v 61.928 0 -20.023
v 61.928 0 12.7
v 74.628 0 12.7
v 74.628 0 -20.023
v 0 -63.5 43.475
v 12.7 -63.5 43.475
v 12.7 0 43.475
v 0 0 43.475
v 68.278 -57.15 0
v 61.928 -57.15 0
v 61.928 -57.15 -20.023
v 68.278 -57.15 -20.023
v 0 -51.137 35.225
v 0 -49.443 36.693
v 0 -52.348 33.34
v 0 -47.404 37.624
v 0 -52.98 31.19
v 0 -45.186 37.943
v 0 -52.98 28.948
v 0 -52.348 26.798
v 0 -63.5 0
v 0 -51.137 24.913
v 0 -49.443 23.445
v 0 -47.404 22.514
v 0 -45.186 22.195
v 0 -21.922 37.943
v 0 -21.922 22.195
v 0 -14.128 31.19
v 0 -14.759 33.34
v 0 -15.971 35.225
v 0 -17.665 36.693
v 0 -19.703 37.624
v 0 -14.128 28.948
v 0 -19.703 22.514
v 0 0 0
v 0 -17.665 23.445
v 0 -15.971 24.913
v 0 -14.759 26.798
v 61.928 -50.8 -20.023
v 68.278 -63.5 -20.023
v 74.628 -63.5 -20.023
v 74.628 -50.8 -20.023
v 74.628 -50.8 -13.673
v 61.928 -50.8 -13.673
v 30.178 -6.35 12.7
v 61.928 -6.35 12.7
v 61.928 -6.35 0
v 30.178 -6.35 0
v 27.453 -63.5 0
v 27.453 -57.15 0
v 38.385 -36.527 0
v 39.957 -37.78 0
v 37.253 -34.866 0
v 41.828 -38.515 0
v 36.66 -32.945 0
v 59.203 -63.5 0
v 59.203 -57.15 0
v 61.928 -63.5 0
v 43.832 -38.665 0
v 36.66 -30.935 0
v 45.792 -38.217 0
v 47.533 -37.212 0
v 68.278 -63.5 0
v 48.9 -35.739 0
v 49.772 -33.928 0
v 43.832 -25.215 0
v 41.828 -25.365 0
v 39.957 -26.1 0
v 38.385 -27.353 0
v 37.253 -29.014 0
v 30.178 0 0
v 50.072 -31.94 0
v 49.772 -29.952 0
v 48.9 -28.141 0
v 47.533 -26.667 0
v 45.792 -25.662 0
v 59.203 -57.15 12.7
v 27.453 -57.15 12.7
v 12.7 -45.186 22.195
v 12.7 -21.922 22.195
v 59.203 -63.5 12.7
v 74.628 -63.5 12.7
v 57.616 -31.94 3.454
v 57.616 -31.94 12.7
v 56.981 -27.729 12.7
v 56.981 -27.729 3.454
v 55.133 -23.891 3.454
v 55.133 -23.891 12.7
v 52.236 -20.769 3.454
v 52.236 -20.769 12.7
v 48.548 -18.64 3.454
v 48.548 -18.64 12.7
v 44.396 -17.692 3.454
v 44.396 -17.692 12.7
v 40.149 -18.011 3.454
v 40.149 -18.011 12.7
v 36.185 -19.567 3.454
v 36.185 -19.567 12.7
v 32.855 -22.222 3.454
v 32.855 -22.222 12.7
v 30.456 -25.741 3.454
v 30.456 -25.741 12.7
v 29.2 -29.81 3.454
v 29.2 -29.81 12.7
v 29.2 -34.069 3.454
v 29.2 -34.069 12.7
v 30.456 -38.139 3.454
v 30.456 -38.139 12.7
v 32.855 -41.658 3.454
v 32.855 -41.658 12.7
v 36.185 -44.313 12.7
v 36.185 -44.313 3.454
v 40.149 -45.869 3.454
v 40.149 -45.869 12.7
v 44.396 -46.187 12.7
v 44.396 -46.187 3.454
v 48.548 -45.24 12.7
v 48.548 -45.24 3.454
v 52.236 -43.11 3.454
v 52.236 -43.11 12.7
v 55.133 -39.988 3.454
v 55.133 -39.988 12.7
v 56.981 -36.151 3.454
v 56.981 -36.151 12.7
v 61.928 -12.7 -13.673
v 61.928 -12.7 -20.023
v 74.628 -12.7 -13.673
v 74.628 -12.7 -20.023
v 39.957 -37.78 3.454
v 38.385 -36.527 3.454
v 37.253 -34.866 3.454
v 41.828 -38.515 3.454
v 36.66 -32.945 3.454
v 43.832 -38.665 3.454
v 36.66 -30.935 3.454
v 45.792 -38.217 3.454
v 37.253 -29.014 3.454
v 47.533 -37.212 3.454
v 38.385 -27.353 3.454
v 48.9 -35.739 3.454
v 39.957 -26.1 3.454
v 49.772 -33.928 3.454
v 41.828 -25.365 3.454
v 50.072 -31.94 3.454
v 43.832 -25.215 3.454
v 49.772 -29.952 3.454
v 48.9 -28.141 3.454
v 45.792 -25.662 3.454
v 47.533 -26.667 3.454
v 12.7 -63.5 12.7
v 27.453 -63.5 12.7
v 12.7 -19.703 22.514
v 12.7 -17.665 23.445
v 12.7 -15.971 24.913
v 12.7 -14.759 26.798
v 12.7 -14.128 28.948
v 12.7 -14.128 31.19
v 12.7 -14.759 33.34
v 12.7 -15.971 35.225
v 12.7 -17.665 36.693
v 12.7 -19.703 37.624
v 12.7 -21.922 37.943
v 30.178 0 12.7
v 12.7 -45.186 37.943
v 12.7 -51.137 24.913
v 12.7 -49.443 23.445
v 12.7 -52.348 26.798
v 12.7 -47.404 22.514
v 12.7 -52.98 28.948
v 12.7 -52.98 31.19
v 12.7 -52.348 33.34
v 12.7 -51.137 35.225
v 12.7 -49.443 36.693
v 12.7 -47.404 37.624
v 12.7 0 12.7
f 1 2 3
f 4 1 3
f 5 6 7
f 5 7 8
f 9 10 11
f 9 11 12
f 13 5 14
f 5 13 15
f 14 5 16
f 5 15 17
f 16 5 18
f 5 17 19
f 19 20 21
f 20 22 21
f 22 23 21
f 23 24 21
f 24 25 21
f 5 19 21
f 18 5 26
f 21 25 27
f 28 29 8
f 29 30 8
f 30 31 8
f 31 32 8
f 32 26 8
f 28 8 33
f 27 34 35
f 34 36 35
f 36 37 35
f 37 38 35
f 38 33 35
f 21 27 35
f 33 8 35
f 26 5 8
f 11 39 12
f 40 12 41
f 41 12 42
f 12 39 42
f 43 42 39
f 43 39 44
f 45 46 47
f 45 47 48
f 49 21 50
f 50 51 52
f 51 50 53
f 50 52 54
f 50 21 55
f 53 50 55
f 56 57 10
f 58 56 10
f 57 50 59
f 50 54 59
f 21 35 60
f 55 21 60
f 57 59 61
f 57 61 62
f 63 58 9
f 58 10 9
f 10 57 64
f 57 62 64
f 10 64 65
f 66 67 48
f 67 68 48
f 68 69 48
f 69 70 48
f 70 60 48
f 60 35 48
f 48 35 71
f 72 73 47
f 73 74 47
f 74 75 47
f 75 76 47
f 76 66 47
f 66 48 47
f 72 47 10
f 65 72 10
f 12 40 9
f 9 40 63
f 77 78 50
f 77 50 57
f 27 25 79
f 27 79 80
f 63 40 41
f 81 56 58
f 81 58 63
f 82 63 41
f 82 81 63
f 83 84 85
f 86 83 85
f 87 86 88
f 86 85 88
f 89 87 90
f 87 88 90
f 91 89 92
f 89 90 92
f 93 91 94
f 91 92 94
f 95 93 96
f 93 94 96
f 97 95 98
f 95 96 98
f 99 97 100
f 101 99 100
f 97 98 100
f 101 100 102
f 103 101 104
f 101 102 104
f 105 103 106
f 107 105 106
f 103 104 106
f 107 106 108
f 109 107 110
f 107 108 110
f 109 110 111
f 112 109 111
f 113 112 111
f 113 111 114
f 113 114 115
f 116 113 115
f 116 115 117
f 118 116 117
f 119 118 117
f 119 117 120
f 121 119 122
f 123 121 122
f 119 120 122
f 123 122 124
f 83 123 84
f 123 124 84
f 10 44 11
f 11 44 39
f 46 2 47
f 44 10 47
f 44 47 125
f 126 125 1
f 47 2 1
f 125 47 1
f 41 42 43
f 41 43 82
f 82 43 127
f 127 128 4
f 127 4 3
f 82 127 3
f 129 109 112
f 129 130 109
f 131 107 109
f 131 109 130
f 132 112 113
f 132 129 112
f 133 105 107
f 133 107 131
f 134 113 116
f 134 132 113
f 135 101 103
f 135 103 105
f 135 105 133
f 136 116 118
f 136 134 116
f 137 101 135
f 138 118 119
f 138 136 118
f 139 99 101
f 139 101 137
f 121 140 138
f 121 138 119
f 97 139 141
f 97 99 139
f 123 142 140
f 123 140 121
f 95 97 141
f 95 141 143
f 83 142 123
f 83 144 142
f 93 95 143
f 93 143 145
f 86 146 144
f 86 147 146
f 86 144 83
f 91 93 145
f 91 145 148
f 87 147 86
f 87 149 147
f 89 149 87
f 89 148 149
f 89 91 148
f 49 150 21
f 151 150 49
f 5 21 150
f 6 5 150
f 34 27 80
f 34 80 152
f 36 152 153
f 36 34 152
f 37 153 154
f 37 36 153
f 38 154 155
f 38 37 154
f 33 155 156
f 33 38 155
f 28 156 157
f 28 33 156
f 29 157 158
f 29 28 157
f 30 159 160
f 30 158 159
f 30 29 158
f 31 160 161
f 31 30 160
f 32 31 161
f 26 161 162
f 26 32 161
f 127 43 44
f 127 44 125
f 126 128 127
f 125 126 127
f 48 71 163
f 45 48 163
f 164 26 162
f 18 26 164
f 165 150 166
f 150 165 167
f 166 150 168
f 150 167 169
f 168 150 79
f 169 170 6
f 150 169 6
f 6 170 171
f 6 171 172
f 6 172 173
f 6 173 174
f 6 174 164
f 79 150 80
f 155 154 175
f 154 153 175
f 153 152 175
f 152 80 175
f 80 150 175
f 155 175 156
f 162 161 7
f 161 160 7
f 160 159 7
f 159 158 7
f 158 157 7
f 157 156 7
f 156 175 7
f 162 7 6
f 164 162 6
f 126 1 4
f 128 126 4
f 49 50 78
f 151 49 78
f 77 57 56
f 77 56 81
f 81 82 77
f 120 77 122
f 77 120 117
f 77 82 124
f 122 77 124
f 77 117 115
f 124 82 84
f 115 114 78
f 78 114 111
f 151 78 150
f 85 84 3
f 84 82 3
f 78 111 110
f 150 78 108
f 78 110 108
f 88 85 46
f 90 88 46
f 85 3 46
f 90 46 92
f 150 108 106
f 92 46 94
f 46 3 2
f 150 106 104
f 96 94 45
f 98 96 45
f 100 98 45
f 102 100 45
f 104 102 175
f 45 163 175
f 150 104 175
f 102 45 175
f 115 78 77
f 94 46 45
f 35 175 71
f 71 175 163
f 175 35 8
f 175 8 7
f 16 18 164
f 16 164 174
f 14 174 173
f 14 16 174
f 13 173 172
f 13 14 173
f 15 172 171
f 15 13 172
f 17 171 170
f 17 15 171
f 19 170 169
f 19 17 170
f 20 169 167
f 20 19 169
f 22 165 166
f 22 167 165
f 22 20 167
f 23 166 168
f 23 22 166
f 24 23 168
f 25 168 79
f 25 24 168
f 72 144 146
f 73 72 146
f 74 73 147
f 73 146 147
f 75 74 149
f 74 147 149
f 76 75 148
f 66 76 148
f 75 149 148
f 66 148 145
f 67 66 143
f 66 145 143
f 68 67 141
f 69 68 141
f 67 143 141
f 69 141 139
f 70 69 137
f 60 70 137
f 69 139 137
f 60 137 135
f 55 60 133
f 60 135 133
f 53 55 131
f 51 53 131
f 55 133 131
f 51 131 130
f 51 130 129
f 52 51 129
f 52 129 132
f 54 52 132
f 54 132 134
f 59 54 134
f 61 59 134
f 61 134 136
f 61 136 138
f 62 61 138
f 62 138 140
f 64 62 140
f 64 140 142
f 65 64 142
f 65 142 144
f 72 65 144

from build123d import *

# Parameters (mm, degrees)
F1_DEPTH  = 63.5
F2_W      = 31.75
F2_H      = 12.7
F2_W_2    = 6.35
F2_H_2    = 20.0227687303
F3_DEPTH  = 6.35
F4_W      = 38.1
F4_H      = 6.35
F5_DEPTH  = 74.629437754
F7_DEPTH  = 74.629437754
F8_R      = 14.2875
F8_R_2    = 6.7437
F9_DEPTH  = 9.2456
F10_R     = 6.7437
F11_DEPTH = 23.4781687303
F12_W     = 31.75
F12_H     = 12.7
F13_DEPTH = 6.35


with BuildPart() as f1:
    # F0 (on Front) → F1 (new body)
    with BuildSketch(Plane.XZ):
        Polygon((0, 43.474850689), (0, 0), (61.928437754, 0), (61.928437754, -20.0227687303), (74.628437754, -20.0227687303), (74.628437754, 12.7), (61.928437754, 12.7), (30.178437754, 12.7), (12.7, 12.7), (12.7, 43.474850689), align=None)
    extrude(amount=F1_DEPTH)

    # F2 (on face) → F3 (cut, symmetric)
    with BuildSketch(Plane.XZ.offset(63.5)):
        with Locations((43.3283648044, 6.35)):
            Rectangle(F2_W, F2_H)
        with Locations((65.103437754, -10.0113843652)):
            Rectangle(F2_W_2, F2_H_2)
    extrude(amount=F3_DEPTH, both=True, mode=Mode.SUBTRACT)

    # F4 (on face) → F5 (cut, through all)
    with BuildSketch(Plane.YZ.offset(74.628437754)):
        with Locations((-31.75, -16.8477687303)):
            Rectangle(F4_W, F4_H)
    extrude(amount=-F5_DEPTH, mode=Mode.SUBTRACT)

    # F6 (on Right) → F7 (cut, through all)
    with BuildSketch(Plane.YZ):
        with BuildLine():
            Line((-21.9217978256, 37.9429917058), (-45.1858863235, 37.9429917058))
            ThreePointArc((-45.1858863235, 37.9429917058), (-53.0598863235, 30.0689917058), (-45.1858863235, 22.1949917058))
            Line((-45.1858863235, 22.1949917058), (-21.9217978256, 22.1949917058))
            ThreePointArc((-21.9217978256, 22.1949917058), (-14.0477978256, 30.0689917058), (-21.9217978256, 37.9429917058))
        make_face()
    extrude(amount=F7_DEPTH, mode=Mode.SUBTRACT)

    # F8 (on face) → F9 (cut)
    with BuildSketch(Plane.XY.offset(12.7)):
        with Locations((43.3283648044, -31.9399088621)):
            Circle(F8_R)
        with Locations((43.3283648044, -31.9399088621)):
            Circle(F8_R_2, mode=Mode.SUBTRACT)
        with Locations((43.3283648044, -31.9399088621)):
            Circle(F8_R_2)
    extrude(amount=-F9_DEPTH, mode=Mode.SUBTRACT)

    # F10 (on face) → F11 (cut, through all)
    with BuildSketch(Plane.XY.offset(3.4544)):
        with Locations((43.3283648044, -31.9399088621)):
            Circle(F10_R)
    extrude(amount=-F11_DEPTH, mode=Mode.SUBTRACT)

    # F12 (on face) → F13 (cut, symmetric)
    with BuildSketch(Plane(origin=(0, 0, 0), x_dir=(-1, 0, 0), z_dir=(0, 1, 0))):
        with Locations((-46.053437754, 6.35)):
            Rectangle(F12_W, F12_H)
    extrude(amount=F13_DEPTH, both=True, mode=Mode.SUBTRACT)


solid = f1.part
